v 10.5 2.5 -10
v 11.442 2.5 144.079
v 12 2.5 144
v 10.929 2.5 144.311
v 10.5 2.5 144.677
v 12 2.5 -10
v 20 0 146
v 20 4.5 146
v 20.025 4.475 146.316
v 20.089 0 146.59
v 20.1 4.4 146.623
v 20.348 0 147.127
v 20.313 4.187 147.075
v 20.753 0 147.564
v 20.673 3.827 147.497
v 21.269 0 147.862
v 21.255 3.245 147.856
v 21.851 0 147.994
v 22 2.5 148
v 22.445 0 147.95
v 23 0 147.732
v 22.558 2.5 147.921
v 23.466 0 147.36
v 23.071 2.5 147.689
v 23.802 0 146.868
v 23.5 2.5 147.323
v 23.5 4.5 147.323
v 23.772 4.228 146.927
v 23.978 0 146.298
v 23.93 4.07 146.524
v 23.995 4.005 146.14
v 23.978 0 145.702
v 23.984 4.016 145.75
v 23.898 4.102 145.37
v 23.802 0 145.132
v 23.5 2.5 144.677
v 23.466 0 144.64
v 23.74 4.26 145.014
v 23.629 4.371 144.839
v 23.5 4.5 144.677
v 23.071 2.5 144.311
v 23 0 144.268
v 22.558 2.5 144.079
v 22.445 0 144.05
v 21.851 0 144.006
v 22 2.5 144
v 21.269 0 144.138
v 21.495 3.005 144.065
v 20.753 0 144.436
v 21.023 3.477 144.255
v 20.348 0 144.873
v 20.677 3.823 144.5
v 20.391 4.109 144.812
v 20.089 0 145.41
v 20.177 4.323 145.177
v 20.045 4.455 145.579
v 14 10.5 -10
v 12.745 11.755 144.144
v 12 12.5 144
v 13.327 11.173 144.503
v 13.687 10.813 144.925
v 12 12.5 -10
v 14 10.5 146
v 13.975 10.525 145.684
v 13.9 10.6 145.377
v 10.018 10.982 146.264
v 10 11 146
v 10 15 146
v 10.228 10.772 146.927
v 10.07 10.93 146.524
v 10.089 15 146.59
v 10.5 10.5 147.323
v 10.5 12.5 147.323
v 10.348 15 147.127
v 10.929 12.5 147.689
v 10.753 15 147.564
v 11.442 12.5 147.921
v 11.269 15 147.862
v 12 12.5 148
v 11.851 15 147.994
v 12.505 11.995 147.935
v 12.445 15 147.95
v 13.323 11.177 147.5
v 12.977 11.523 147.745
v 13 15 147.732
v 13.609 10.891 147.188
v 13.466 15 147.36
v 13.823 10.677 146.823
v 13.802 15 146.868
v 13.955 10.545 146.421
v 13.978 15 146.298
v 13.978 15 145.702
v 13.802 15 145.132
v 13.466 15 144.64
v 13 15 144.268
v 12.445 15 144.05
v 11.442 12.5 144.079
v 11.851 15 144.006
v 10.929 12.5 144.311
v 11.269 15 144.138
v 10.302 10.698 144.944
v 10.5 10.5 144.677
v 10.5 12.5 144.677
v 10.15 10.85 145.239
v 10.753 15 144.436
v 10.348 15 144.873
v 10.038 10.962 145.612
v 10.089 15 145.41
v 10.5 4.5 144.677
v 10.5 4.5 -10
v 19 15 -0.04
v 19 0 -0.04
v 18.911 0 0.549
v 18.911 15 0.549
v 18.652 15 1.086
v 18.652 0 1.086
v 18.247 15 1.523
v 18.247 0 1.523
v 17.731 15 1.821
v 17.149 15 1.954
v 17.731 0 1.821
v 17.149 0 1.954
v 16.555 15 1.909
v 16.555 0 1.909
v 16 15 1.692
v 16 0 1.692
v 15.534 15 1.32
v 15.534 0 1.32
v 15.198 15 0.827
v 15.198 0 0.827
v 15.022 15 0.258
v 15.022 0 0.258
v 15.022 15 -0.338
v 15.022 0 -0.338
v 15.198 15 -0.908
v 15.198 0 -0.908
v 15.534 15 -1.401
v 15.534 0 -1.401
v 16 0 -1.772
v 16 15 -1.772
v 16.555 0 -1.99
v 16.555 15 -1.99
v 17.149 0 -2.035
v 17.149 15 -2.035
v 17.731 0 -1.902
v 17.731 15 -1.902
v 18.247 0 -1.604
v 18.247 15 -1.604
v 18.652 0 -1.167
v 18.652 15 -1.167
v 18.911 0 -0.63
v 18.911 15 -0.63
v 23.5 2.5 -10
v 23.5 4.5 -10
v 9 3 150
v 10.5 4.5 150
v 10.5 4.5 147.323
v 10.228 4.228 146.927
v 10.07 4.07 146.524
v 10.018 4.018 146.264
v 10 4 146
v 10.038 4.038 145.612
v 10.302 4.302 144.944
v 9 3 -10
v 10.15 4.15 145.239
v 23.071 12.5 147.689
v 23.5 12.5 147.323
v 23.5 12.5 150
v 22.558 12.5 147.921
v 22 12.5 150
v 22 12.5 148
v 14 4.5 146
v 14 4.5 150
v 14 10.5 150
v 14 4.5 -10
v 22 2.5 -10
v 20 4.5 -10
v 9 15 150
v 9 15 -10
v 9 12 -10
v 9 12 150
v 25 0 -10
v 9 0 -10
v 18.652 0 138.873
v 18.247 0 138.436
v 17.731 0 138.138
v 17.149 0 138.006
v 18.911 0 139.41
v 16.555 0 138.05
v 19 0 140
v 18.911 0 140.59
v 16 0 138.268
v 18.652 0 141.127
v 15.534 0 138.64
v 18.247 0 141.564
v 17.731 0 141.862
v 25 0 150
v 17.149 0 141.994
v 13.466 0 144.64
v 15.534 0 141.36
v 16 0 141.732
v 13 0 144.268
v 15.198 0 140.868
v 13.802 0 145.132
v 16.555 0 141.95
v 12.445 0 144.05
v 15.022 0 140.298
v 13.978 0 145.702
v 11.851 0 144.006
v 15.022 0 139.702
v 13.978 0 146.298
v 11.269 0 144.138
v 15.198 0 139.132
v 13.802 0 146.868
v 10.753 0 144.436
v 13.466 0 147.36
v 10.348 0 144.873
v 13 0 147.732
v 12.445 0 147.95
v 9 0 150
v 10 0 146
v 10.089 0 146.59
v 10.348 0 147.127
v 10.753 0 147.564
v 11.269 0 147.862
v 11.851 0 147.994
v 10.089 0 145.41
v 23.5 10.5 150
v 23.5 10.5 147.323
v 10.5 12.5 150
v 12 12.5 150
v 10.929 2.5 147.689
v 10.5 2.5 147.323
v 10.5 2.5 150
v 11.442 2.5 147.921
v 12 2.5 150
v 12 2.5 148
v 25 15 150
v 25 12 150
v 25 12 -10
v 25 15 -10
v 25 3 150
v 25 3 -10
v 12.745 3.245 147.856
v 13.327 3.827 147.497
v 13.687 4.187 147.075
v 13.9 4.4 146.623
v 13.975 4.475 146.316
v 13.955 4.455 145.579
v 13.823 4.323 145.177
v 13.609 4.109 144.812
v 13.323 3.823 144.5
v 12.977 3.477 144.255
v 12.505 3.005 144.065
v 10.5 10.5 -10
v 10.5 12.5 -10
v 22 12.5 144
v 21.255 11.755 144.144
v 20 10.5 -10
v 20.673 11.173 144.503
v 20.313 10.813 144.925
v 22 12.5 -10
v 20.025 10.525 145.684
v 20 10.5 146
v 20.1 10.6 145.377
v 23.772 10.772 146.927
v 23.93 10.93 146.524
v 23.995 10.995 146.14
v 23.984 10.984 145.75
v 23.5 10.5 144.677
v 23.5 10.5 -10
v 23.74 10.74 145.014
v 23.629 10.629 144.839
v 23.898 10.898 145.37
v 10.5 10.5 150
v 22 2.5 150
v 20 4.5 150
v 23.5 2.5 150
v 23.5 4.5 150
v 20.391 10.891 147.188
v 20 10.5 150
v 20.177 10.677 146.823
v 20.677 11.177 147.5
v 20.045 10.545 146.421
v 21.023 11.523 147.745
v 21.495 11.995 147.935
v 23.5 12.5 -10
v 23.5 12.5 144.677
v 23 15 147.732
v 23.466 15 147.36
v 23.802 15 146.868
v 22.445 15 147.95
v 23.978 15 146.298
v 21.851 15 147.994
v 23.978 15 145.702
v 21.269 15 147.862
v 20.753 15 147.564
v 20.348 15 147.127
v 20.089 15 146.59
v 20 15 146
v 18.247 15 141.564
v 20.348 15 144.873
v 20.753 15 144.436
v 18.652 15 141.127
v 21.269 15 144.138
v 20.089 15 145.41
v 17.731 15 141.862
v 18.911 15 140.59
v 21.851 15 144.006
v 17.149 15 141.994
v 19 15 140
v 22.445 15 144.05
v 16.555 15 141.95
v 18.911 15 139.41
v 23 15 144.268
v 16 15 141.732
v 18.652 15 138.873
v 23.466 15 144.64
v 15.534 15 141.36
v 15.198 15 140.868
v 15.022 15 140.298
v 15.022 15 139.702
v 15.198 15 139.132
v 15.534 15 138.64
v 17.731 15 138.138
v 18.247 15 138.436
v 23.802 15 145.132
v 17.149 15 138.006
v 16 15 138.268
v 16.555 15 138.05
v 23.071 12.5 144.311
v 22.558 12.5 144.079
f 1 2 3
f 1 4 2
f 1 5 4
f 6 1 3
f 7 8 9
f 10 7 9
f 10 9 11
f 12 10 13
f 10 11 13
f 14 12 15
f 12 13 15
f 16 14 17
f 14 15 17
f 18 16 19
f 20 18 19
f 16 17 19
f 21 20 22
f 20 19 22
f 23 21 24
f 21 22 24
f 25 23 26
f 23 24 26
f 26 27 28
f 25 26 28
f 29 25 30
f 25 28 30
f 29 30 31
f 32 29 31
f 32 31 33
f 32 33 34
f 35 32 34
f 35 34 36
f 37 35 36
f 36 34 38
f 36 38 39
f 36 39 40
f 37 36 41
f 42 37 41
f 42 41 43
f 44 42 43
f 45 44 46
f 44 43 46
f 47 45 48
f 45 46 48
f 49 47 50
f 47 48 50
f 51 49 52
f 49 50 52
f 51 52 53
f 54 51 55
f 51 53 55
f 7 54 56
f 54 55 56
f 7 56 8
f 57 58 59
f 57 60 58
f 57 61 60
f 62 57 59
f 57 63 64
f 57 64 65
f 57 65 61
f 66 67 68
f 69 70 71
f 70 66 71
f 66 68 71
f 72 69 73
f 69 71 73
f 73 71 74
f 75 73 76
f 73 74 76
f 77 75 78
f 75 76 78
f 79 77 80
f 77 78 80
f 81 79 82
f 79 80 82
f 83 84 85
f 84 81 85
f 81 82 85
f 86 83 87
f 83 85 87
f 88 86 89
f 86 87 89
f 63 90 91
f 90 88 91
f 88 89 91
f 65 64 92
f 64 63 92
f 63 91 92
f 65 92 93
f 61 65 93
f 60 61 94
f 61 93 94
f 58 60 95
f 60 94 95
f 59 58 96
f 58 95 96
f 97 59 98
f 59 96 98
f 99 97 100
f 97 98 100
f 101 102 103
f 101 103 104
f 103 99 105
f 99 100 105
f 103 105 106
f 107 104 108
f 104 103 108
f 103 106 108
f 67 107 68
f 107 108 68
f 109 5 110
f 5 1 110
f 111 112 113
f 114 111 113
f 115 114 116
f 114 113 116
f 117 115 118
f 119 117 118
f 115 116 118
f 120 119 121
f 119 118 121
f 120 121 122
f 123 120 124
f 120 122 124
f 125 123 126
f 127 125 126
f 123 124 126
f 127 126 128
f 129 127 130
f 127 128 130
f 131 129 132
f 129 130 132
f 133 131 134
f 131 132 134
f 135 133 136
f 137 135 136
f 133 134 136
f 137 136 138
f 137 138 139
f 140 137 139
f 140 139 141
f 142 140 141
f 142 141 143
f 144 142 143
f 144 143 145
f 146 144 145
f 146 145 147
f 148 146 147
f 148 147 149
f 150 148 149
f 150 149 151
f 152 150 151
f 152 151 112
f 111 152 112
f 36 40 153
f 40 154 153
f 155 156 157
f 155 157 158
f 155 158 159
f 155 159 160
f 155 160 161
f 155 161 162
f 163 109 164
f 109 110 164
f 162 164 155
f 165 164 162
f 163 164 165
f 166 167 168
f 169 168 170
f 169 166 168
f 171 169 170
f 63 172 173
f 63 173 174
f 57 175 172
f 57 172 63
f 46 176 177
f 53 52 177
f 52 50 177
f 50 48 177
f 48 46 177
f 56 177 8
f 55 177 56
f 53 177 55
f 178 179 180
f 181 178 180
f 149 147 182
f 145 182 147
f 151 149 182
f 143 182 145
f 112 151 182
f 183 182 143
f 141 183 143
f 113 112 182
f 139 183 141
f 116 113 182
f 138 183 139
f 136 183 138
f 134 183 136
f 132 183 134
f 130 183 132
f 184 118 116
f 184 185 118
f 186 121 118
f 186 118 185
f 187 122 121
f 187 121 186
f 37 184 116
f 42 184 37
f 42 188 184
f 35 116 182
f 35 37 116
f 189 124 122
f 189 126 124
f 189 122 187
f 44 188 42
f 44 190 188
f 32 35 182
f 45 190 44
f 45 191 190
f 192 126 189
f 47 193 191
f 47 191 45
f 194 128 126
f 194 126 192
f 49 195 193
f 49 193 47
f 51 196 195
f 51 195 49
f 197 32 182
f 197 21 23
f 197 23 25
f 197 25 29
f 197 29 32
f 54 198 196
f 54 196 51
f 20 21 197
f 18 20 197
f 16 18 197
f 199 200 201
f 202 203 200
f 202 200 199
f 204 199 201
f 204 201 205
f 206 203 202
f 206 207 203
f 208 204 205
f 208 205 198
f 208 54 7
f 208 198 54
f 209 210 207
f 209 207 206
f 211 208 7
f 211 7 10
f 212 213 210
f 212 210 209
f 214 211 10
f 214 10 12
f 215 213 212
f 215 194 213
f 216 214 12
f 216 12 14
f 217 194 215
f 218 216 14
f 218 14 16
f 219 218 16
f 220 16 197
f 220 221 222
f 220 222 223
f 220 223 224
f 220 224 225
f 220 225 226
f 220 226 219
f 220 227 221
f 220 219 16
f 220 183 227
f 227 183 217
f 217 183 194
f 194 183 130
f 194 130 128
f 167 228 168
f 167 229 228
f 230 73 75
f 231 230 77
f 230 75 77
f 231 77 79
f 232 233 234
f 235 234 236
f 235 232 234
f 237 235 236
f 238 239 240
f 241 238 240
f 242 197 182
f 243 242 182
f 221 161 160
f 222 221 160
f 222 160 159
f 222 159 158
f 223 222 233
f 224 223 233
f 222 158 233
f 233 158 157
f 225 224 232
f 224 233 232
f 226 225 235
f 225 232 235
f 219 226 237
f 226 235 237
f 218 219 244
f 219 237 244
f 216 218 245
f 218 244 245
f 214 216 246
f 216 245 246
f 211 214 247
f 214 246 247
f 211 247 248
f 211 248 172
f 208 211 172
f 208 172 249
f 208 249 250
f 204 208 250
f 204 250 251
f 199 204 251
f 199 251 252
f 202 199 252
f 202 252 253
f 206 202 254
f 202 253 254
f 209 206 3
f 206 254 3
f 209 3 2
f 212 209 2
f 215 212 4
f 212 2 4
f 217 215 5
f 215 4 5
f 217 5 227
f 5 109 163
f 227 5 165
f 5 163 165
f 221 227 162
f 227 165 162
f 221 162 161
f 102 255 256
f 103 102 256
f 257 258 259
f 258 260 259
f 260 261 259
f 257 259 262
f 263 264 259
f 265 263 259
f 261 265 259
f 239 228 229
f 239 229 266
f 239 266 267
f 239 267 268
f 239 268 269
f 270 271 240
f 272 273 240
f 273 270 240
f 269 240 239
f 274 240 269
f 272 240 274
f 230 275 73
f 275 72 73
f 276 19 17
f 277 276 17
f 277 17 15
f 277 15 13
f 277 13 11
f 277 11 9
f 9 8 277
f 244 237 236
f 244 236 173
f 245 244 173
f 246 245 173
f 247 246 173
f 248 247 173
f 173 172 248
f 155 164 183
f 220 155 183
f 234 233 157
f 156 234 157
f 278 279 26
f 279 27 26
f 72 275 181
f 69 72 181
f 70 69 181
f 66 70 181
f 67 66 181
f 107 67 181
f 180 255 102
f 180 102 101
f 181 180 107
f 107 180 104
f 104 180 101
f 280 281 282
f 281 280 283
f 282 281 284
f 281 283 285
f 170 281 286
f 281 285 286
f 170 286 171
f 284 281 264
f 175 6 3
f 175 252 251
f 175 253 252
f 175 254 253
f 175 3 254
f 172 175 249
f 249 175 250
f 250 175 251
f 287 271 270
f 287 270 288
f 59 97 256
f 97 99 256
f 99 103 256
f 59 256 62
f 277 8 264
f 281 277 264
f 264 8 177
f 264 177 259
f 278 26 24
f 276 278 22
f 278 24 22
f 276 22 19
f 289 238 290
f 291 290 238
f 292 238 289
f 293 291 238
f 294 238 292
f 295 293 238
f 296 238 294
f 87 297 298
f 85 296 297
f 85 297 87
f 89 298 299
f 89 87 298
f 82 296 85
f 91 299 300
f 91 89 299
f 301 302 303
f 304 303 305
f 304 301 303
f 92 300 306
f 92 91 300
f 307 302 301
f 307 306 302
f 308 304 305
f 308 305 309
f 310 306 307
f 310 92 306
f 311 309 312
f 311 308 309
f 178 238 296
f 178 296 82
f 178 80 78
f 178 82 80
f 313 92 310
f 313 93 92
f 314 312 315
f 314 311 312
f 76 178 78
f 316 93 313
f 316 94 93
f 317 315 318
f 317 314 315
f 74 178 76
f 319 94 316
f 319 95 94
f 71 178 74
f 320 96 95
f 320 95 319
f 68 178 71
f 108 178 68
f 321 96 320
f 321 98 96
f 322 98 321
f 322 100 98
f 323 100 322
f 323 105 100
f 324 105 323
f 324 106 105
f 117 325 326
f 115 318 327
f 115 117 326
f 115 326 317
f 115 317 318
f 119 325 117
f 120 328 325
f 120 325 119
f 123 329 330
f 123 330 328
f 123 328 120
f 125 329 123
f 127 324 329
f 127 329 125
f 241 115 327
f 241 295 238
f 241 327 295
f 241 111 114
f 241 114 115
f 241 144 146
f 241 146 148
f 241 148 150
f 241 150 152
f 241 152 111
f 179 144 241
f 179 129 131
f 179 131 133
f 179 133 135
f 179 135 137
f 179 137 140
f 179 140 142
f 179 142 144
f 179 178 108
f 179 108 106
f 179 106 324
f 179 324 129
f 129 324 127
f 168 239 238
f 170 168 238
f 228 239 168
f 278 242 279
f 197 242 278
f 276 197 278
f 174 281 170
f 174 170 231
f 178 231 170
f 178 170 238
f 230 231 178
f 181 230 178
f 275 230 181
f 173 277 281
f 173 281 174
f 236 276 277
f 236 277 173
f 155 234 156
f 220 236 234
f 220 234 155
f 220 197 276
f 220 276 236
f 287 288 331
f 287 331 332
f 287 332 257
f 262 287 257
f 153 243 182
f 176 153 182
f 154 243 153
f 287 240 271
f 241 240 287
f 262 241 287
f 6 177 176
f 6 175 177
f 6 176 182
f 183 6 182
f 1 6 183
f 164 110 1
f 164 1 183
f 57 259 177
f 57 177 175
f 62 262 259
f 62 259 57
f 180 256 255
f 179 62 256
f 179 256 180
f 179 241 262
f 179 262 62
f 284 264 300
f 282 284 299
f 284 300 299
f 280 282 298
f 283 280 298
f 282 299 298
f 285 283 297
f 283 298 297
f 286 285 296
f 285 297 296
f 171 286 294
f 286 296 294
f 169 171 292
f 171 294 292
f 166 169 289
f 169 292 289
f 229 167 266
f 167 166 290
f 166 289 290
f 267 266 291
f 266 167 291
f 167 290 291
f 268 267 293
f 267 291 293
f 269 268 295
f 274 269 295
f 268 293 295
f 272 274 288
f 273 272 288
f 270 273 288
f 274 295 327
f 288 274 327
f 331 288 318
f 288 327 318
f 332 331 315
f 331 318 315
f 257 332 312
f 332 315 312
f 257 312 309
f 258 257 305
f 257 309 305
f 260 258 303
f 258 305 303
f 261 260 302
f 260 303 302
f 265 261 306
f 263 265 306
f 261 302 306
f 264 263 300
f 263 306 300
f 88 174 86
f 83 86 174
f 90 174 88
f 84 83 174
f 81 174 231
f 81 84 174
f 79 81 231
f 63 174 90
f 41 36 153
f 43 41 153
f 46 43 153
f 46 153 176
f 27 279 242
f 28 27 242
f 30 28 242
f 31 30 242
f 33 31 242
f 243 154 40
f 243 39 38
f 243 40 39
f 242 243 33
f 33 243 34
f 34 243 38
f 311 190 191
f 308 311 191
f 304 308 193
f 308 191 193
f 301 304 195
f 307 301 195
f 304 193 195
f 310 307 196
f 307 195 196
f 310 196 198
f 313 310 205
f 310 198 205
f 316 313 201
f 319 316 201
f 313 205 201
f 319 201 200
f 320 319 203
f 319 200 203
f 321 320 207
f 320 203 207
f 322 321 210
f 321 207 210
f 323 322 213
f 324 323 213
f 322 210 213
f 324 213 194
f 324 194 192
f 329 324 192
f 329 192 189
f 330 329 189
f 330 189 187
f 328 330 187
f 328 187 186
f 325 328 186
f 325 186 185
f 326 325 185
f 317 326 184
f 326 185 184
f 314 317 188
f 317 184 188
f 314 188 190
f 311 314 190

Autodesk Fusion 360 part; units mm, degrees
sketch "Sketch1" plane through (0, 0, 0) normal (1, 0, 0) x (0, 0, -1)
  line L0 (-150, 0) -> (-150, 10)
  line L1 (-150, 10) -> (0, 10)
  line L2 (0, 10) -> (0, 0)
  line L3 (-150, 10) -> (-140, 10)
  line L4 (-140, 10) -> (-140, 0)
  line L5 (-140, 0) -> (-150, 0)
  line L6 (-150, 0) -> (-150, 10)
  line L7 (0, 0) -> (-10, 0)
  line L8 (-10, 0) -> (-10, 10)
  line L9 (-10, 10) -> (0, 10)
  line L10 (0, 10) -> (0, 0)
  line L11 (-2.5, 0) -> (-12.5, 0)
  line L12 (-12.5, 10) -> (-2.5, 10)
  line L13 (-150, 0) -> (-147.5, 0)
  line L14 (0, 0) -> (-147.5, 0)
  dimension "d2" = 10
  dimension "d3" = 130
  dimension "d4" = 10
  dimension "d9" = 10
  dimension "d11" = 10
extrude "Extrude1" add sketch "Sketch1" along normal blind 15
extrude "Extrude4" add 1 faces at (15, 6.6667, 100) along direction (1, 0, 0) blind 10
extrude "Extrude5" add 1 faces at (16.6667, 10, 50) along direction (0, 1, 0) blind 5
sketch "Sketch2" plane through (0, 0, 0) normal (0, 0, -1) x (-1, 0, 0)
  line L0 (0, 15) -> (-25, 15)
  line L1 (-25, 15) -> (-25, 0)
  line L2 (-25, 0) -> (0, 0)
  line L3 (-25, 0) -> (-25, 3)
  line L4 (-25, 15) -> (-25, 12)
  line L5 (-23.5, 10.5) -> (-25, 12)
  line L6 (-23.5, 4.5) -> (-25, 3)
  line L7 (-23.5, 4.5) -> (-23.5, 2.5)
  line L8 (-23.5, 12.5) -> (-22, 12.5)
  line L9 (-23.5, 2.5) -> (-22, 2.5)
  line L10 (-22, 2.5) -> (-20, 4.5)
  line L11 (-20, 4.5) -> (-20, 10.5)
  line L12 (-20, 10.5) -> (-22, 12.5)
  line L13 (-23.5, 2.5) -> (-23.5, 4.5)
  line L14 (-23.5, 10.5) -> (-23.5, 12.5)
  line L15 (-20, 4.5) -> (-14, 4.5)
  line L16 (-14, 4.5) -> (-14, 10.5)
  line L17 (-14, 10.5) -> (-20, 10.5)
  line L18 (-20, 10.5) -> (-20, 4.5)
  line L19 (-17, 4.5) -> (-17, 10.5)
  line L20 (-14, 7.5) -> (-20, 7.5)
  line L21 (-10.5, 4.5) -> (-9, 3)
  line L22 (-10.5, 2.5) -> (-10.5, 4.5)
  line L23 (-10.5, 2.5) -> (-12, 2.5)
  line L24 (-12, 2.5) -> (-14, 4.5)
  line L25 (-14, 4.5) -> (-14, 10.5)
  line L26 (-14, 10.5) -> (-12, 12.5)
  line L27 (-10.5, 12.5) -> (-12, 12.5)
  line L28 (-10.5, 10.5) -> (-10.5, 12.5)
  line L29 (-10.5, 10.5) -> (-9, 12)
  line L30 (-9, 3) -> (-9, 12)
  line L31 (-9, 0) -> (-25, 0)
  line L32 (-25, 0) -> (-25, 15)
  line L33 (-25, 15) -> (-9, 15)
  line L34 (-9, 15) -> (-9, 0)
  line L35 (0, 0) -> (-15, 0)
  line L36 (-15, 0) -> (-15, 15)
  line L37 (-15, 15) -> (0, 15)
  line L38 (0, 15) -> (0, 0)
  line L39 (0, 0) -> (0, 15)
  dimension "d22" = 3
  dimension "d23" = 3
  dimension "d24" = 6
  dimension "d27" = 10
  dimension "d28" = 6
  dimension "d29" = 135
  dimension "d30" = 135
  dimension "d31" = 45
  dimension "d32" = 45.001
  dimension "d33" = 1.5
  dimension "d34" = 1.5
  dimension "d35" = 2.1213
  dimension "d37" = 2
  dimension "d38" = 6
  dimension "d39" = 6
  dimension "d40" = 16
  dimension "d45" = 15
  dimension "d48" = 15
extrude "Extrude6" cut sketch "Sketch2" against normal blind 185 contours L16 L21 L22 L23 L24 L25 L26 L27 L28 L29 L30 L34 | L1 L5 L6 L7 L8 L9 L10 L11 L12 L13 L14 L18 L32
extrude "Extrude8" add sketch "Sketch2" along normal blind 10 contours L0 L17 L26 L27 L28 L29 L33 L34 L36 L37 | L0 L1 L4 L5 L8 L12 L14 L17 L32 L33 L36 | L2 L15 L21 L22 L23 L24 L31 L34 L35 L36 | L17 L19 L20 L36 | L16 L17 L20 L25 L36 | L1 L2 L3 L6 L7 L9 L10 L13 L15 L31 L32 L36 | L11 L17 L18 L19 L20 | L15 L19 L20 L36 | L15 L16 L20 L25 L36 | L11 L15 L18 L19 L20
extrude "Extrude9" cut 1 faces at (3, 6, 0) along direction (0, 0, 1) blind 240
sketch "Sketch3" plane through (0, 0, 0) normal (0, -1, 0) x (1, 0, 0)
  line L0 (9, 150) -> (9, -10)
  line L1 (9, -10) -> (25, -10)
  line L2 (25, -10) -> (25, 150)
  line L3 (25, 150) -> (9, 150)
  line L4 (25, 150) -> (25, 145)
  line L5 (25, 145) -> (9, 145)
  line L6 (9, 145) -> (9, -5)
  line L7 (9, -5) -> (25, -5)
  line L8 (25, -5) -> (25, 145)
  line L9 (25, 145) -> (9, 145)
  line L10 (9, 145) -> (9, 135)
  line L11 (9, 135) -> (25, 135)
  line L12 (25, 135) -> (25, 145)
  line L13 (9, -5) -> (25, -5)
  line L14 (25, -5) -> (25, 5)
  line L15 (25, 5) -> (9, 5)
  line L16 (9, 5) -> (9, -5)
  circle A0 centre (17, -0.0404) radius 2
  circle A1 centre (17, 140) radius 2
  dimension "d51" = 16
  dimension "d52" = 150
  dimension "d53" = 5
  dimension "d54" = 10
  dimension "d55" = 130
  dimension "d56" = 16
  dimension "d63" = 4
  dimension "d64" = 4
  dimension "d65" = 140.0404
extrude "Extrude10" cut sketch "Sketch3" against normal blind 50 contours A0 | A1
sketch "Sketch4" plane through (0, 15, 0) normal (0, 1, 0) x (-1, 0, 0)
  circle A0 centre (-17, 140) radius 2
  circle A1 centre (-17, -0.0404) radius 2
  line L0 (-9, -10) -> (-9, 150)
  line L1 (-9, 150) -> (-25, 150)
  line L2 (-25, 150) -> (-25, -10)
  line L3 (-25, -10) -> (-9, -10)
  circle A2 centre (-12, 146) radius 2
  circle A3 centre (-22, 146) radius 2
  dimension "d66" = 4
  dimension "d68" = 4
  dimension "d69" = 3
  dimension "d70" = 3
  dimension "d71" = 4
  dimension "d72" = 4
extrude "Extrude11" cut sketch "Sketch4" against normal blind 24 contours A2 | A3
